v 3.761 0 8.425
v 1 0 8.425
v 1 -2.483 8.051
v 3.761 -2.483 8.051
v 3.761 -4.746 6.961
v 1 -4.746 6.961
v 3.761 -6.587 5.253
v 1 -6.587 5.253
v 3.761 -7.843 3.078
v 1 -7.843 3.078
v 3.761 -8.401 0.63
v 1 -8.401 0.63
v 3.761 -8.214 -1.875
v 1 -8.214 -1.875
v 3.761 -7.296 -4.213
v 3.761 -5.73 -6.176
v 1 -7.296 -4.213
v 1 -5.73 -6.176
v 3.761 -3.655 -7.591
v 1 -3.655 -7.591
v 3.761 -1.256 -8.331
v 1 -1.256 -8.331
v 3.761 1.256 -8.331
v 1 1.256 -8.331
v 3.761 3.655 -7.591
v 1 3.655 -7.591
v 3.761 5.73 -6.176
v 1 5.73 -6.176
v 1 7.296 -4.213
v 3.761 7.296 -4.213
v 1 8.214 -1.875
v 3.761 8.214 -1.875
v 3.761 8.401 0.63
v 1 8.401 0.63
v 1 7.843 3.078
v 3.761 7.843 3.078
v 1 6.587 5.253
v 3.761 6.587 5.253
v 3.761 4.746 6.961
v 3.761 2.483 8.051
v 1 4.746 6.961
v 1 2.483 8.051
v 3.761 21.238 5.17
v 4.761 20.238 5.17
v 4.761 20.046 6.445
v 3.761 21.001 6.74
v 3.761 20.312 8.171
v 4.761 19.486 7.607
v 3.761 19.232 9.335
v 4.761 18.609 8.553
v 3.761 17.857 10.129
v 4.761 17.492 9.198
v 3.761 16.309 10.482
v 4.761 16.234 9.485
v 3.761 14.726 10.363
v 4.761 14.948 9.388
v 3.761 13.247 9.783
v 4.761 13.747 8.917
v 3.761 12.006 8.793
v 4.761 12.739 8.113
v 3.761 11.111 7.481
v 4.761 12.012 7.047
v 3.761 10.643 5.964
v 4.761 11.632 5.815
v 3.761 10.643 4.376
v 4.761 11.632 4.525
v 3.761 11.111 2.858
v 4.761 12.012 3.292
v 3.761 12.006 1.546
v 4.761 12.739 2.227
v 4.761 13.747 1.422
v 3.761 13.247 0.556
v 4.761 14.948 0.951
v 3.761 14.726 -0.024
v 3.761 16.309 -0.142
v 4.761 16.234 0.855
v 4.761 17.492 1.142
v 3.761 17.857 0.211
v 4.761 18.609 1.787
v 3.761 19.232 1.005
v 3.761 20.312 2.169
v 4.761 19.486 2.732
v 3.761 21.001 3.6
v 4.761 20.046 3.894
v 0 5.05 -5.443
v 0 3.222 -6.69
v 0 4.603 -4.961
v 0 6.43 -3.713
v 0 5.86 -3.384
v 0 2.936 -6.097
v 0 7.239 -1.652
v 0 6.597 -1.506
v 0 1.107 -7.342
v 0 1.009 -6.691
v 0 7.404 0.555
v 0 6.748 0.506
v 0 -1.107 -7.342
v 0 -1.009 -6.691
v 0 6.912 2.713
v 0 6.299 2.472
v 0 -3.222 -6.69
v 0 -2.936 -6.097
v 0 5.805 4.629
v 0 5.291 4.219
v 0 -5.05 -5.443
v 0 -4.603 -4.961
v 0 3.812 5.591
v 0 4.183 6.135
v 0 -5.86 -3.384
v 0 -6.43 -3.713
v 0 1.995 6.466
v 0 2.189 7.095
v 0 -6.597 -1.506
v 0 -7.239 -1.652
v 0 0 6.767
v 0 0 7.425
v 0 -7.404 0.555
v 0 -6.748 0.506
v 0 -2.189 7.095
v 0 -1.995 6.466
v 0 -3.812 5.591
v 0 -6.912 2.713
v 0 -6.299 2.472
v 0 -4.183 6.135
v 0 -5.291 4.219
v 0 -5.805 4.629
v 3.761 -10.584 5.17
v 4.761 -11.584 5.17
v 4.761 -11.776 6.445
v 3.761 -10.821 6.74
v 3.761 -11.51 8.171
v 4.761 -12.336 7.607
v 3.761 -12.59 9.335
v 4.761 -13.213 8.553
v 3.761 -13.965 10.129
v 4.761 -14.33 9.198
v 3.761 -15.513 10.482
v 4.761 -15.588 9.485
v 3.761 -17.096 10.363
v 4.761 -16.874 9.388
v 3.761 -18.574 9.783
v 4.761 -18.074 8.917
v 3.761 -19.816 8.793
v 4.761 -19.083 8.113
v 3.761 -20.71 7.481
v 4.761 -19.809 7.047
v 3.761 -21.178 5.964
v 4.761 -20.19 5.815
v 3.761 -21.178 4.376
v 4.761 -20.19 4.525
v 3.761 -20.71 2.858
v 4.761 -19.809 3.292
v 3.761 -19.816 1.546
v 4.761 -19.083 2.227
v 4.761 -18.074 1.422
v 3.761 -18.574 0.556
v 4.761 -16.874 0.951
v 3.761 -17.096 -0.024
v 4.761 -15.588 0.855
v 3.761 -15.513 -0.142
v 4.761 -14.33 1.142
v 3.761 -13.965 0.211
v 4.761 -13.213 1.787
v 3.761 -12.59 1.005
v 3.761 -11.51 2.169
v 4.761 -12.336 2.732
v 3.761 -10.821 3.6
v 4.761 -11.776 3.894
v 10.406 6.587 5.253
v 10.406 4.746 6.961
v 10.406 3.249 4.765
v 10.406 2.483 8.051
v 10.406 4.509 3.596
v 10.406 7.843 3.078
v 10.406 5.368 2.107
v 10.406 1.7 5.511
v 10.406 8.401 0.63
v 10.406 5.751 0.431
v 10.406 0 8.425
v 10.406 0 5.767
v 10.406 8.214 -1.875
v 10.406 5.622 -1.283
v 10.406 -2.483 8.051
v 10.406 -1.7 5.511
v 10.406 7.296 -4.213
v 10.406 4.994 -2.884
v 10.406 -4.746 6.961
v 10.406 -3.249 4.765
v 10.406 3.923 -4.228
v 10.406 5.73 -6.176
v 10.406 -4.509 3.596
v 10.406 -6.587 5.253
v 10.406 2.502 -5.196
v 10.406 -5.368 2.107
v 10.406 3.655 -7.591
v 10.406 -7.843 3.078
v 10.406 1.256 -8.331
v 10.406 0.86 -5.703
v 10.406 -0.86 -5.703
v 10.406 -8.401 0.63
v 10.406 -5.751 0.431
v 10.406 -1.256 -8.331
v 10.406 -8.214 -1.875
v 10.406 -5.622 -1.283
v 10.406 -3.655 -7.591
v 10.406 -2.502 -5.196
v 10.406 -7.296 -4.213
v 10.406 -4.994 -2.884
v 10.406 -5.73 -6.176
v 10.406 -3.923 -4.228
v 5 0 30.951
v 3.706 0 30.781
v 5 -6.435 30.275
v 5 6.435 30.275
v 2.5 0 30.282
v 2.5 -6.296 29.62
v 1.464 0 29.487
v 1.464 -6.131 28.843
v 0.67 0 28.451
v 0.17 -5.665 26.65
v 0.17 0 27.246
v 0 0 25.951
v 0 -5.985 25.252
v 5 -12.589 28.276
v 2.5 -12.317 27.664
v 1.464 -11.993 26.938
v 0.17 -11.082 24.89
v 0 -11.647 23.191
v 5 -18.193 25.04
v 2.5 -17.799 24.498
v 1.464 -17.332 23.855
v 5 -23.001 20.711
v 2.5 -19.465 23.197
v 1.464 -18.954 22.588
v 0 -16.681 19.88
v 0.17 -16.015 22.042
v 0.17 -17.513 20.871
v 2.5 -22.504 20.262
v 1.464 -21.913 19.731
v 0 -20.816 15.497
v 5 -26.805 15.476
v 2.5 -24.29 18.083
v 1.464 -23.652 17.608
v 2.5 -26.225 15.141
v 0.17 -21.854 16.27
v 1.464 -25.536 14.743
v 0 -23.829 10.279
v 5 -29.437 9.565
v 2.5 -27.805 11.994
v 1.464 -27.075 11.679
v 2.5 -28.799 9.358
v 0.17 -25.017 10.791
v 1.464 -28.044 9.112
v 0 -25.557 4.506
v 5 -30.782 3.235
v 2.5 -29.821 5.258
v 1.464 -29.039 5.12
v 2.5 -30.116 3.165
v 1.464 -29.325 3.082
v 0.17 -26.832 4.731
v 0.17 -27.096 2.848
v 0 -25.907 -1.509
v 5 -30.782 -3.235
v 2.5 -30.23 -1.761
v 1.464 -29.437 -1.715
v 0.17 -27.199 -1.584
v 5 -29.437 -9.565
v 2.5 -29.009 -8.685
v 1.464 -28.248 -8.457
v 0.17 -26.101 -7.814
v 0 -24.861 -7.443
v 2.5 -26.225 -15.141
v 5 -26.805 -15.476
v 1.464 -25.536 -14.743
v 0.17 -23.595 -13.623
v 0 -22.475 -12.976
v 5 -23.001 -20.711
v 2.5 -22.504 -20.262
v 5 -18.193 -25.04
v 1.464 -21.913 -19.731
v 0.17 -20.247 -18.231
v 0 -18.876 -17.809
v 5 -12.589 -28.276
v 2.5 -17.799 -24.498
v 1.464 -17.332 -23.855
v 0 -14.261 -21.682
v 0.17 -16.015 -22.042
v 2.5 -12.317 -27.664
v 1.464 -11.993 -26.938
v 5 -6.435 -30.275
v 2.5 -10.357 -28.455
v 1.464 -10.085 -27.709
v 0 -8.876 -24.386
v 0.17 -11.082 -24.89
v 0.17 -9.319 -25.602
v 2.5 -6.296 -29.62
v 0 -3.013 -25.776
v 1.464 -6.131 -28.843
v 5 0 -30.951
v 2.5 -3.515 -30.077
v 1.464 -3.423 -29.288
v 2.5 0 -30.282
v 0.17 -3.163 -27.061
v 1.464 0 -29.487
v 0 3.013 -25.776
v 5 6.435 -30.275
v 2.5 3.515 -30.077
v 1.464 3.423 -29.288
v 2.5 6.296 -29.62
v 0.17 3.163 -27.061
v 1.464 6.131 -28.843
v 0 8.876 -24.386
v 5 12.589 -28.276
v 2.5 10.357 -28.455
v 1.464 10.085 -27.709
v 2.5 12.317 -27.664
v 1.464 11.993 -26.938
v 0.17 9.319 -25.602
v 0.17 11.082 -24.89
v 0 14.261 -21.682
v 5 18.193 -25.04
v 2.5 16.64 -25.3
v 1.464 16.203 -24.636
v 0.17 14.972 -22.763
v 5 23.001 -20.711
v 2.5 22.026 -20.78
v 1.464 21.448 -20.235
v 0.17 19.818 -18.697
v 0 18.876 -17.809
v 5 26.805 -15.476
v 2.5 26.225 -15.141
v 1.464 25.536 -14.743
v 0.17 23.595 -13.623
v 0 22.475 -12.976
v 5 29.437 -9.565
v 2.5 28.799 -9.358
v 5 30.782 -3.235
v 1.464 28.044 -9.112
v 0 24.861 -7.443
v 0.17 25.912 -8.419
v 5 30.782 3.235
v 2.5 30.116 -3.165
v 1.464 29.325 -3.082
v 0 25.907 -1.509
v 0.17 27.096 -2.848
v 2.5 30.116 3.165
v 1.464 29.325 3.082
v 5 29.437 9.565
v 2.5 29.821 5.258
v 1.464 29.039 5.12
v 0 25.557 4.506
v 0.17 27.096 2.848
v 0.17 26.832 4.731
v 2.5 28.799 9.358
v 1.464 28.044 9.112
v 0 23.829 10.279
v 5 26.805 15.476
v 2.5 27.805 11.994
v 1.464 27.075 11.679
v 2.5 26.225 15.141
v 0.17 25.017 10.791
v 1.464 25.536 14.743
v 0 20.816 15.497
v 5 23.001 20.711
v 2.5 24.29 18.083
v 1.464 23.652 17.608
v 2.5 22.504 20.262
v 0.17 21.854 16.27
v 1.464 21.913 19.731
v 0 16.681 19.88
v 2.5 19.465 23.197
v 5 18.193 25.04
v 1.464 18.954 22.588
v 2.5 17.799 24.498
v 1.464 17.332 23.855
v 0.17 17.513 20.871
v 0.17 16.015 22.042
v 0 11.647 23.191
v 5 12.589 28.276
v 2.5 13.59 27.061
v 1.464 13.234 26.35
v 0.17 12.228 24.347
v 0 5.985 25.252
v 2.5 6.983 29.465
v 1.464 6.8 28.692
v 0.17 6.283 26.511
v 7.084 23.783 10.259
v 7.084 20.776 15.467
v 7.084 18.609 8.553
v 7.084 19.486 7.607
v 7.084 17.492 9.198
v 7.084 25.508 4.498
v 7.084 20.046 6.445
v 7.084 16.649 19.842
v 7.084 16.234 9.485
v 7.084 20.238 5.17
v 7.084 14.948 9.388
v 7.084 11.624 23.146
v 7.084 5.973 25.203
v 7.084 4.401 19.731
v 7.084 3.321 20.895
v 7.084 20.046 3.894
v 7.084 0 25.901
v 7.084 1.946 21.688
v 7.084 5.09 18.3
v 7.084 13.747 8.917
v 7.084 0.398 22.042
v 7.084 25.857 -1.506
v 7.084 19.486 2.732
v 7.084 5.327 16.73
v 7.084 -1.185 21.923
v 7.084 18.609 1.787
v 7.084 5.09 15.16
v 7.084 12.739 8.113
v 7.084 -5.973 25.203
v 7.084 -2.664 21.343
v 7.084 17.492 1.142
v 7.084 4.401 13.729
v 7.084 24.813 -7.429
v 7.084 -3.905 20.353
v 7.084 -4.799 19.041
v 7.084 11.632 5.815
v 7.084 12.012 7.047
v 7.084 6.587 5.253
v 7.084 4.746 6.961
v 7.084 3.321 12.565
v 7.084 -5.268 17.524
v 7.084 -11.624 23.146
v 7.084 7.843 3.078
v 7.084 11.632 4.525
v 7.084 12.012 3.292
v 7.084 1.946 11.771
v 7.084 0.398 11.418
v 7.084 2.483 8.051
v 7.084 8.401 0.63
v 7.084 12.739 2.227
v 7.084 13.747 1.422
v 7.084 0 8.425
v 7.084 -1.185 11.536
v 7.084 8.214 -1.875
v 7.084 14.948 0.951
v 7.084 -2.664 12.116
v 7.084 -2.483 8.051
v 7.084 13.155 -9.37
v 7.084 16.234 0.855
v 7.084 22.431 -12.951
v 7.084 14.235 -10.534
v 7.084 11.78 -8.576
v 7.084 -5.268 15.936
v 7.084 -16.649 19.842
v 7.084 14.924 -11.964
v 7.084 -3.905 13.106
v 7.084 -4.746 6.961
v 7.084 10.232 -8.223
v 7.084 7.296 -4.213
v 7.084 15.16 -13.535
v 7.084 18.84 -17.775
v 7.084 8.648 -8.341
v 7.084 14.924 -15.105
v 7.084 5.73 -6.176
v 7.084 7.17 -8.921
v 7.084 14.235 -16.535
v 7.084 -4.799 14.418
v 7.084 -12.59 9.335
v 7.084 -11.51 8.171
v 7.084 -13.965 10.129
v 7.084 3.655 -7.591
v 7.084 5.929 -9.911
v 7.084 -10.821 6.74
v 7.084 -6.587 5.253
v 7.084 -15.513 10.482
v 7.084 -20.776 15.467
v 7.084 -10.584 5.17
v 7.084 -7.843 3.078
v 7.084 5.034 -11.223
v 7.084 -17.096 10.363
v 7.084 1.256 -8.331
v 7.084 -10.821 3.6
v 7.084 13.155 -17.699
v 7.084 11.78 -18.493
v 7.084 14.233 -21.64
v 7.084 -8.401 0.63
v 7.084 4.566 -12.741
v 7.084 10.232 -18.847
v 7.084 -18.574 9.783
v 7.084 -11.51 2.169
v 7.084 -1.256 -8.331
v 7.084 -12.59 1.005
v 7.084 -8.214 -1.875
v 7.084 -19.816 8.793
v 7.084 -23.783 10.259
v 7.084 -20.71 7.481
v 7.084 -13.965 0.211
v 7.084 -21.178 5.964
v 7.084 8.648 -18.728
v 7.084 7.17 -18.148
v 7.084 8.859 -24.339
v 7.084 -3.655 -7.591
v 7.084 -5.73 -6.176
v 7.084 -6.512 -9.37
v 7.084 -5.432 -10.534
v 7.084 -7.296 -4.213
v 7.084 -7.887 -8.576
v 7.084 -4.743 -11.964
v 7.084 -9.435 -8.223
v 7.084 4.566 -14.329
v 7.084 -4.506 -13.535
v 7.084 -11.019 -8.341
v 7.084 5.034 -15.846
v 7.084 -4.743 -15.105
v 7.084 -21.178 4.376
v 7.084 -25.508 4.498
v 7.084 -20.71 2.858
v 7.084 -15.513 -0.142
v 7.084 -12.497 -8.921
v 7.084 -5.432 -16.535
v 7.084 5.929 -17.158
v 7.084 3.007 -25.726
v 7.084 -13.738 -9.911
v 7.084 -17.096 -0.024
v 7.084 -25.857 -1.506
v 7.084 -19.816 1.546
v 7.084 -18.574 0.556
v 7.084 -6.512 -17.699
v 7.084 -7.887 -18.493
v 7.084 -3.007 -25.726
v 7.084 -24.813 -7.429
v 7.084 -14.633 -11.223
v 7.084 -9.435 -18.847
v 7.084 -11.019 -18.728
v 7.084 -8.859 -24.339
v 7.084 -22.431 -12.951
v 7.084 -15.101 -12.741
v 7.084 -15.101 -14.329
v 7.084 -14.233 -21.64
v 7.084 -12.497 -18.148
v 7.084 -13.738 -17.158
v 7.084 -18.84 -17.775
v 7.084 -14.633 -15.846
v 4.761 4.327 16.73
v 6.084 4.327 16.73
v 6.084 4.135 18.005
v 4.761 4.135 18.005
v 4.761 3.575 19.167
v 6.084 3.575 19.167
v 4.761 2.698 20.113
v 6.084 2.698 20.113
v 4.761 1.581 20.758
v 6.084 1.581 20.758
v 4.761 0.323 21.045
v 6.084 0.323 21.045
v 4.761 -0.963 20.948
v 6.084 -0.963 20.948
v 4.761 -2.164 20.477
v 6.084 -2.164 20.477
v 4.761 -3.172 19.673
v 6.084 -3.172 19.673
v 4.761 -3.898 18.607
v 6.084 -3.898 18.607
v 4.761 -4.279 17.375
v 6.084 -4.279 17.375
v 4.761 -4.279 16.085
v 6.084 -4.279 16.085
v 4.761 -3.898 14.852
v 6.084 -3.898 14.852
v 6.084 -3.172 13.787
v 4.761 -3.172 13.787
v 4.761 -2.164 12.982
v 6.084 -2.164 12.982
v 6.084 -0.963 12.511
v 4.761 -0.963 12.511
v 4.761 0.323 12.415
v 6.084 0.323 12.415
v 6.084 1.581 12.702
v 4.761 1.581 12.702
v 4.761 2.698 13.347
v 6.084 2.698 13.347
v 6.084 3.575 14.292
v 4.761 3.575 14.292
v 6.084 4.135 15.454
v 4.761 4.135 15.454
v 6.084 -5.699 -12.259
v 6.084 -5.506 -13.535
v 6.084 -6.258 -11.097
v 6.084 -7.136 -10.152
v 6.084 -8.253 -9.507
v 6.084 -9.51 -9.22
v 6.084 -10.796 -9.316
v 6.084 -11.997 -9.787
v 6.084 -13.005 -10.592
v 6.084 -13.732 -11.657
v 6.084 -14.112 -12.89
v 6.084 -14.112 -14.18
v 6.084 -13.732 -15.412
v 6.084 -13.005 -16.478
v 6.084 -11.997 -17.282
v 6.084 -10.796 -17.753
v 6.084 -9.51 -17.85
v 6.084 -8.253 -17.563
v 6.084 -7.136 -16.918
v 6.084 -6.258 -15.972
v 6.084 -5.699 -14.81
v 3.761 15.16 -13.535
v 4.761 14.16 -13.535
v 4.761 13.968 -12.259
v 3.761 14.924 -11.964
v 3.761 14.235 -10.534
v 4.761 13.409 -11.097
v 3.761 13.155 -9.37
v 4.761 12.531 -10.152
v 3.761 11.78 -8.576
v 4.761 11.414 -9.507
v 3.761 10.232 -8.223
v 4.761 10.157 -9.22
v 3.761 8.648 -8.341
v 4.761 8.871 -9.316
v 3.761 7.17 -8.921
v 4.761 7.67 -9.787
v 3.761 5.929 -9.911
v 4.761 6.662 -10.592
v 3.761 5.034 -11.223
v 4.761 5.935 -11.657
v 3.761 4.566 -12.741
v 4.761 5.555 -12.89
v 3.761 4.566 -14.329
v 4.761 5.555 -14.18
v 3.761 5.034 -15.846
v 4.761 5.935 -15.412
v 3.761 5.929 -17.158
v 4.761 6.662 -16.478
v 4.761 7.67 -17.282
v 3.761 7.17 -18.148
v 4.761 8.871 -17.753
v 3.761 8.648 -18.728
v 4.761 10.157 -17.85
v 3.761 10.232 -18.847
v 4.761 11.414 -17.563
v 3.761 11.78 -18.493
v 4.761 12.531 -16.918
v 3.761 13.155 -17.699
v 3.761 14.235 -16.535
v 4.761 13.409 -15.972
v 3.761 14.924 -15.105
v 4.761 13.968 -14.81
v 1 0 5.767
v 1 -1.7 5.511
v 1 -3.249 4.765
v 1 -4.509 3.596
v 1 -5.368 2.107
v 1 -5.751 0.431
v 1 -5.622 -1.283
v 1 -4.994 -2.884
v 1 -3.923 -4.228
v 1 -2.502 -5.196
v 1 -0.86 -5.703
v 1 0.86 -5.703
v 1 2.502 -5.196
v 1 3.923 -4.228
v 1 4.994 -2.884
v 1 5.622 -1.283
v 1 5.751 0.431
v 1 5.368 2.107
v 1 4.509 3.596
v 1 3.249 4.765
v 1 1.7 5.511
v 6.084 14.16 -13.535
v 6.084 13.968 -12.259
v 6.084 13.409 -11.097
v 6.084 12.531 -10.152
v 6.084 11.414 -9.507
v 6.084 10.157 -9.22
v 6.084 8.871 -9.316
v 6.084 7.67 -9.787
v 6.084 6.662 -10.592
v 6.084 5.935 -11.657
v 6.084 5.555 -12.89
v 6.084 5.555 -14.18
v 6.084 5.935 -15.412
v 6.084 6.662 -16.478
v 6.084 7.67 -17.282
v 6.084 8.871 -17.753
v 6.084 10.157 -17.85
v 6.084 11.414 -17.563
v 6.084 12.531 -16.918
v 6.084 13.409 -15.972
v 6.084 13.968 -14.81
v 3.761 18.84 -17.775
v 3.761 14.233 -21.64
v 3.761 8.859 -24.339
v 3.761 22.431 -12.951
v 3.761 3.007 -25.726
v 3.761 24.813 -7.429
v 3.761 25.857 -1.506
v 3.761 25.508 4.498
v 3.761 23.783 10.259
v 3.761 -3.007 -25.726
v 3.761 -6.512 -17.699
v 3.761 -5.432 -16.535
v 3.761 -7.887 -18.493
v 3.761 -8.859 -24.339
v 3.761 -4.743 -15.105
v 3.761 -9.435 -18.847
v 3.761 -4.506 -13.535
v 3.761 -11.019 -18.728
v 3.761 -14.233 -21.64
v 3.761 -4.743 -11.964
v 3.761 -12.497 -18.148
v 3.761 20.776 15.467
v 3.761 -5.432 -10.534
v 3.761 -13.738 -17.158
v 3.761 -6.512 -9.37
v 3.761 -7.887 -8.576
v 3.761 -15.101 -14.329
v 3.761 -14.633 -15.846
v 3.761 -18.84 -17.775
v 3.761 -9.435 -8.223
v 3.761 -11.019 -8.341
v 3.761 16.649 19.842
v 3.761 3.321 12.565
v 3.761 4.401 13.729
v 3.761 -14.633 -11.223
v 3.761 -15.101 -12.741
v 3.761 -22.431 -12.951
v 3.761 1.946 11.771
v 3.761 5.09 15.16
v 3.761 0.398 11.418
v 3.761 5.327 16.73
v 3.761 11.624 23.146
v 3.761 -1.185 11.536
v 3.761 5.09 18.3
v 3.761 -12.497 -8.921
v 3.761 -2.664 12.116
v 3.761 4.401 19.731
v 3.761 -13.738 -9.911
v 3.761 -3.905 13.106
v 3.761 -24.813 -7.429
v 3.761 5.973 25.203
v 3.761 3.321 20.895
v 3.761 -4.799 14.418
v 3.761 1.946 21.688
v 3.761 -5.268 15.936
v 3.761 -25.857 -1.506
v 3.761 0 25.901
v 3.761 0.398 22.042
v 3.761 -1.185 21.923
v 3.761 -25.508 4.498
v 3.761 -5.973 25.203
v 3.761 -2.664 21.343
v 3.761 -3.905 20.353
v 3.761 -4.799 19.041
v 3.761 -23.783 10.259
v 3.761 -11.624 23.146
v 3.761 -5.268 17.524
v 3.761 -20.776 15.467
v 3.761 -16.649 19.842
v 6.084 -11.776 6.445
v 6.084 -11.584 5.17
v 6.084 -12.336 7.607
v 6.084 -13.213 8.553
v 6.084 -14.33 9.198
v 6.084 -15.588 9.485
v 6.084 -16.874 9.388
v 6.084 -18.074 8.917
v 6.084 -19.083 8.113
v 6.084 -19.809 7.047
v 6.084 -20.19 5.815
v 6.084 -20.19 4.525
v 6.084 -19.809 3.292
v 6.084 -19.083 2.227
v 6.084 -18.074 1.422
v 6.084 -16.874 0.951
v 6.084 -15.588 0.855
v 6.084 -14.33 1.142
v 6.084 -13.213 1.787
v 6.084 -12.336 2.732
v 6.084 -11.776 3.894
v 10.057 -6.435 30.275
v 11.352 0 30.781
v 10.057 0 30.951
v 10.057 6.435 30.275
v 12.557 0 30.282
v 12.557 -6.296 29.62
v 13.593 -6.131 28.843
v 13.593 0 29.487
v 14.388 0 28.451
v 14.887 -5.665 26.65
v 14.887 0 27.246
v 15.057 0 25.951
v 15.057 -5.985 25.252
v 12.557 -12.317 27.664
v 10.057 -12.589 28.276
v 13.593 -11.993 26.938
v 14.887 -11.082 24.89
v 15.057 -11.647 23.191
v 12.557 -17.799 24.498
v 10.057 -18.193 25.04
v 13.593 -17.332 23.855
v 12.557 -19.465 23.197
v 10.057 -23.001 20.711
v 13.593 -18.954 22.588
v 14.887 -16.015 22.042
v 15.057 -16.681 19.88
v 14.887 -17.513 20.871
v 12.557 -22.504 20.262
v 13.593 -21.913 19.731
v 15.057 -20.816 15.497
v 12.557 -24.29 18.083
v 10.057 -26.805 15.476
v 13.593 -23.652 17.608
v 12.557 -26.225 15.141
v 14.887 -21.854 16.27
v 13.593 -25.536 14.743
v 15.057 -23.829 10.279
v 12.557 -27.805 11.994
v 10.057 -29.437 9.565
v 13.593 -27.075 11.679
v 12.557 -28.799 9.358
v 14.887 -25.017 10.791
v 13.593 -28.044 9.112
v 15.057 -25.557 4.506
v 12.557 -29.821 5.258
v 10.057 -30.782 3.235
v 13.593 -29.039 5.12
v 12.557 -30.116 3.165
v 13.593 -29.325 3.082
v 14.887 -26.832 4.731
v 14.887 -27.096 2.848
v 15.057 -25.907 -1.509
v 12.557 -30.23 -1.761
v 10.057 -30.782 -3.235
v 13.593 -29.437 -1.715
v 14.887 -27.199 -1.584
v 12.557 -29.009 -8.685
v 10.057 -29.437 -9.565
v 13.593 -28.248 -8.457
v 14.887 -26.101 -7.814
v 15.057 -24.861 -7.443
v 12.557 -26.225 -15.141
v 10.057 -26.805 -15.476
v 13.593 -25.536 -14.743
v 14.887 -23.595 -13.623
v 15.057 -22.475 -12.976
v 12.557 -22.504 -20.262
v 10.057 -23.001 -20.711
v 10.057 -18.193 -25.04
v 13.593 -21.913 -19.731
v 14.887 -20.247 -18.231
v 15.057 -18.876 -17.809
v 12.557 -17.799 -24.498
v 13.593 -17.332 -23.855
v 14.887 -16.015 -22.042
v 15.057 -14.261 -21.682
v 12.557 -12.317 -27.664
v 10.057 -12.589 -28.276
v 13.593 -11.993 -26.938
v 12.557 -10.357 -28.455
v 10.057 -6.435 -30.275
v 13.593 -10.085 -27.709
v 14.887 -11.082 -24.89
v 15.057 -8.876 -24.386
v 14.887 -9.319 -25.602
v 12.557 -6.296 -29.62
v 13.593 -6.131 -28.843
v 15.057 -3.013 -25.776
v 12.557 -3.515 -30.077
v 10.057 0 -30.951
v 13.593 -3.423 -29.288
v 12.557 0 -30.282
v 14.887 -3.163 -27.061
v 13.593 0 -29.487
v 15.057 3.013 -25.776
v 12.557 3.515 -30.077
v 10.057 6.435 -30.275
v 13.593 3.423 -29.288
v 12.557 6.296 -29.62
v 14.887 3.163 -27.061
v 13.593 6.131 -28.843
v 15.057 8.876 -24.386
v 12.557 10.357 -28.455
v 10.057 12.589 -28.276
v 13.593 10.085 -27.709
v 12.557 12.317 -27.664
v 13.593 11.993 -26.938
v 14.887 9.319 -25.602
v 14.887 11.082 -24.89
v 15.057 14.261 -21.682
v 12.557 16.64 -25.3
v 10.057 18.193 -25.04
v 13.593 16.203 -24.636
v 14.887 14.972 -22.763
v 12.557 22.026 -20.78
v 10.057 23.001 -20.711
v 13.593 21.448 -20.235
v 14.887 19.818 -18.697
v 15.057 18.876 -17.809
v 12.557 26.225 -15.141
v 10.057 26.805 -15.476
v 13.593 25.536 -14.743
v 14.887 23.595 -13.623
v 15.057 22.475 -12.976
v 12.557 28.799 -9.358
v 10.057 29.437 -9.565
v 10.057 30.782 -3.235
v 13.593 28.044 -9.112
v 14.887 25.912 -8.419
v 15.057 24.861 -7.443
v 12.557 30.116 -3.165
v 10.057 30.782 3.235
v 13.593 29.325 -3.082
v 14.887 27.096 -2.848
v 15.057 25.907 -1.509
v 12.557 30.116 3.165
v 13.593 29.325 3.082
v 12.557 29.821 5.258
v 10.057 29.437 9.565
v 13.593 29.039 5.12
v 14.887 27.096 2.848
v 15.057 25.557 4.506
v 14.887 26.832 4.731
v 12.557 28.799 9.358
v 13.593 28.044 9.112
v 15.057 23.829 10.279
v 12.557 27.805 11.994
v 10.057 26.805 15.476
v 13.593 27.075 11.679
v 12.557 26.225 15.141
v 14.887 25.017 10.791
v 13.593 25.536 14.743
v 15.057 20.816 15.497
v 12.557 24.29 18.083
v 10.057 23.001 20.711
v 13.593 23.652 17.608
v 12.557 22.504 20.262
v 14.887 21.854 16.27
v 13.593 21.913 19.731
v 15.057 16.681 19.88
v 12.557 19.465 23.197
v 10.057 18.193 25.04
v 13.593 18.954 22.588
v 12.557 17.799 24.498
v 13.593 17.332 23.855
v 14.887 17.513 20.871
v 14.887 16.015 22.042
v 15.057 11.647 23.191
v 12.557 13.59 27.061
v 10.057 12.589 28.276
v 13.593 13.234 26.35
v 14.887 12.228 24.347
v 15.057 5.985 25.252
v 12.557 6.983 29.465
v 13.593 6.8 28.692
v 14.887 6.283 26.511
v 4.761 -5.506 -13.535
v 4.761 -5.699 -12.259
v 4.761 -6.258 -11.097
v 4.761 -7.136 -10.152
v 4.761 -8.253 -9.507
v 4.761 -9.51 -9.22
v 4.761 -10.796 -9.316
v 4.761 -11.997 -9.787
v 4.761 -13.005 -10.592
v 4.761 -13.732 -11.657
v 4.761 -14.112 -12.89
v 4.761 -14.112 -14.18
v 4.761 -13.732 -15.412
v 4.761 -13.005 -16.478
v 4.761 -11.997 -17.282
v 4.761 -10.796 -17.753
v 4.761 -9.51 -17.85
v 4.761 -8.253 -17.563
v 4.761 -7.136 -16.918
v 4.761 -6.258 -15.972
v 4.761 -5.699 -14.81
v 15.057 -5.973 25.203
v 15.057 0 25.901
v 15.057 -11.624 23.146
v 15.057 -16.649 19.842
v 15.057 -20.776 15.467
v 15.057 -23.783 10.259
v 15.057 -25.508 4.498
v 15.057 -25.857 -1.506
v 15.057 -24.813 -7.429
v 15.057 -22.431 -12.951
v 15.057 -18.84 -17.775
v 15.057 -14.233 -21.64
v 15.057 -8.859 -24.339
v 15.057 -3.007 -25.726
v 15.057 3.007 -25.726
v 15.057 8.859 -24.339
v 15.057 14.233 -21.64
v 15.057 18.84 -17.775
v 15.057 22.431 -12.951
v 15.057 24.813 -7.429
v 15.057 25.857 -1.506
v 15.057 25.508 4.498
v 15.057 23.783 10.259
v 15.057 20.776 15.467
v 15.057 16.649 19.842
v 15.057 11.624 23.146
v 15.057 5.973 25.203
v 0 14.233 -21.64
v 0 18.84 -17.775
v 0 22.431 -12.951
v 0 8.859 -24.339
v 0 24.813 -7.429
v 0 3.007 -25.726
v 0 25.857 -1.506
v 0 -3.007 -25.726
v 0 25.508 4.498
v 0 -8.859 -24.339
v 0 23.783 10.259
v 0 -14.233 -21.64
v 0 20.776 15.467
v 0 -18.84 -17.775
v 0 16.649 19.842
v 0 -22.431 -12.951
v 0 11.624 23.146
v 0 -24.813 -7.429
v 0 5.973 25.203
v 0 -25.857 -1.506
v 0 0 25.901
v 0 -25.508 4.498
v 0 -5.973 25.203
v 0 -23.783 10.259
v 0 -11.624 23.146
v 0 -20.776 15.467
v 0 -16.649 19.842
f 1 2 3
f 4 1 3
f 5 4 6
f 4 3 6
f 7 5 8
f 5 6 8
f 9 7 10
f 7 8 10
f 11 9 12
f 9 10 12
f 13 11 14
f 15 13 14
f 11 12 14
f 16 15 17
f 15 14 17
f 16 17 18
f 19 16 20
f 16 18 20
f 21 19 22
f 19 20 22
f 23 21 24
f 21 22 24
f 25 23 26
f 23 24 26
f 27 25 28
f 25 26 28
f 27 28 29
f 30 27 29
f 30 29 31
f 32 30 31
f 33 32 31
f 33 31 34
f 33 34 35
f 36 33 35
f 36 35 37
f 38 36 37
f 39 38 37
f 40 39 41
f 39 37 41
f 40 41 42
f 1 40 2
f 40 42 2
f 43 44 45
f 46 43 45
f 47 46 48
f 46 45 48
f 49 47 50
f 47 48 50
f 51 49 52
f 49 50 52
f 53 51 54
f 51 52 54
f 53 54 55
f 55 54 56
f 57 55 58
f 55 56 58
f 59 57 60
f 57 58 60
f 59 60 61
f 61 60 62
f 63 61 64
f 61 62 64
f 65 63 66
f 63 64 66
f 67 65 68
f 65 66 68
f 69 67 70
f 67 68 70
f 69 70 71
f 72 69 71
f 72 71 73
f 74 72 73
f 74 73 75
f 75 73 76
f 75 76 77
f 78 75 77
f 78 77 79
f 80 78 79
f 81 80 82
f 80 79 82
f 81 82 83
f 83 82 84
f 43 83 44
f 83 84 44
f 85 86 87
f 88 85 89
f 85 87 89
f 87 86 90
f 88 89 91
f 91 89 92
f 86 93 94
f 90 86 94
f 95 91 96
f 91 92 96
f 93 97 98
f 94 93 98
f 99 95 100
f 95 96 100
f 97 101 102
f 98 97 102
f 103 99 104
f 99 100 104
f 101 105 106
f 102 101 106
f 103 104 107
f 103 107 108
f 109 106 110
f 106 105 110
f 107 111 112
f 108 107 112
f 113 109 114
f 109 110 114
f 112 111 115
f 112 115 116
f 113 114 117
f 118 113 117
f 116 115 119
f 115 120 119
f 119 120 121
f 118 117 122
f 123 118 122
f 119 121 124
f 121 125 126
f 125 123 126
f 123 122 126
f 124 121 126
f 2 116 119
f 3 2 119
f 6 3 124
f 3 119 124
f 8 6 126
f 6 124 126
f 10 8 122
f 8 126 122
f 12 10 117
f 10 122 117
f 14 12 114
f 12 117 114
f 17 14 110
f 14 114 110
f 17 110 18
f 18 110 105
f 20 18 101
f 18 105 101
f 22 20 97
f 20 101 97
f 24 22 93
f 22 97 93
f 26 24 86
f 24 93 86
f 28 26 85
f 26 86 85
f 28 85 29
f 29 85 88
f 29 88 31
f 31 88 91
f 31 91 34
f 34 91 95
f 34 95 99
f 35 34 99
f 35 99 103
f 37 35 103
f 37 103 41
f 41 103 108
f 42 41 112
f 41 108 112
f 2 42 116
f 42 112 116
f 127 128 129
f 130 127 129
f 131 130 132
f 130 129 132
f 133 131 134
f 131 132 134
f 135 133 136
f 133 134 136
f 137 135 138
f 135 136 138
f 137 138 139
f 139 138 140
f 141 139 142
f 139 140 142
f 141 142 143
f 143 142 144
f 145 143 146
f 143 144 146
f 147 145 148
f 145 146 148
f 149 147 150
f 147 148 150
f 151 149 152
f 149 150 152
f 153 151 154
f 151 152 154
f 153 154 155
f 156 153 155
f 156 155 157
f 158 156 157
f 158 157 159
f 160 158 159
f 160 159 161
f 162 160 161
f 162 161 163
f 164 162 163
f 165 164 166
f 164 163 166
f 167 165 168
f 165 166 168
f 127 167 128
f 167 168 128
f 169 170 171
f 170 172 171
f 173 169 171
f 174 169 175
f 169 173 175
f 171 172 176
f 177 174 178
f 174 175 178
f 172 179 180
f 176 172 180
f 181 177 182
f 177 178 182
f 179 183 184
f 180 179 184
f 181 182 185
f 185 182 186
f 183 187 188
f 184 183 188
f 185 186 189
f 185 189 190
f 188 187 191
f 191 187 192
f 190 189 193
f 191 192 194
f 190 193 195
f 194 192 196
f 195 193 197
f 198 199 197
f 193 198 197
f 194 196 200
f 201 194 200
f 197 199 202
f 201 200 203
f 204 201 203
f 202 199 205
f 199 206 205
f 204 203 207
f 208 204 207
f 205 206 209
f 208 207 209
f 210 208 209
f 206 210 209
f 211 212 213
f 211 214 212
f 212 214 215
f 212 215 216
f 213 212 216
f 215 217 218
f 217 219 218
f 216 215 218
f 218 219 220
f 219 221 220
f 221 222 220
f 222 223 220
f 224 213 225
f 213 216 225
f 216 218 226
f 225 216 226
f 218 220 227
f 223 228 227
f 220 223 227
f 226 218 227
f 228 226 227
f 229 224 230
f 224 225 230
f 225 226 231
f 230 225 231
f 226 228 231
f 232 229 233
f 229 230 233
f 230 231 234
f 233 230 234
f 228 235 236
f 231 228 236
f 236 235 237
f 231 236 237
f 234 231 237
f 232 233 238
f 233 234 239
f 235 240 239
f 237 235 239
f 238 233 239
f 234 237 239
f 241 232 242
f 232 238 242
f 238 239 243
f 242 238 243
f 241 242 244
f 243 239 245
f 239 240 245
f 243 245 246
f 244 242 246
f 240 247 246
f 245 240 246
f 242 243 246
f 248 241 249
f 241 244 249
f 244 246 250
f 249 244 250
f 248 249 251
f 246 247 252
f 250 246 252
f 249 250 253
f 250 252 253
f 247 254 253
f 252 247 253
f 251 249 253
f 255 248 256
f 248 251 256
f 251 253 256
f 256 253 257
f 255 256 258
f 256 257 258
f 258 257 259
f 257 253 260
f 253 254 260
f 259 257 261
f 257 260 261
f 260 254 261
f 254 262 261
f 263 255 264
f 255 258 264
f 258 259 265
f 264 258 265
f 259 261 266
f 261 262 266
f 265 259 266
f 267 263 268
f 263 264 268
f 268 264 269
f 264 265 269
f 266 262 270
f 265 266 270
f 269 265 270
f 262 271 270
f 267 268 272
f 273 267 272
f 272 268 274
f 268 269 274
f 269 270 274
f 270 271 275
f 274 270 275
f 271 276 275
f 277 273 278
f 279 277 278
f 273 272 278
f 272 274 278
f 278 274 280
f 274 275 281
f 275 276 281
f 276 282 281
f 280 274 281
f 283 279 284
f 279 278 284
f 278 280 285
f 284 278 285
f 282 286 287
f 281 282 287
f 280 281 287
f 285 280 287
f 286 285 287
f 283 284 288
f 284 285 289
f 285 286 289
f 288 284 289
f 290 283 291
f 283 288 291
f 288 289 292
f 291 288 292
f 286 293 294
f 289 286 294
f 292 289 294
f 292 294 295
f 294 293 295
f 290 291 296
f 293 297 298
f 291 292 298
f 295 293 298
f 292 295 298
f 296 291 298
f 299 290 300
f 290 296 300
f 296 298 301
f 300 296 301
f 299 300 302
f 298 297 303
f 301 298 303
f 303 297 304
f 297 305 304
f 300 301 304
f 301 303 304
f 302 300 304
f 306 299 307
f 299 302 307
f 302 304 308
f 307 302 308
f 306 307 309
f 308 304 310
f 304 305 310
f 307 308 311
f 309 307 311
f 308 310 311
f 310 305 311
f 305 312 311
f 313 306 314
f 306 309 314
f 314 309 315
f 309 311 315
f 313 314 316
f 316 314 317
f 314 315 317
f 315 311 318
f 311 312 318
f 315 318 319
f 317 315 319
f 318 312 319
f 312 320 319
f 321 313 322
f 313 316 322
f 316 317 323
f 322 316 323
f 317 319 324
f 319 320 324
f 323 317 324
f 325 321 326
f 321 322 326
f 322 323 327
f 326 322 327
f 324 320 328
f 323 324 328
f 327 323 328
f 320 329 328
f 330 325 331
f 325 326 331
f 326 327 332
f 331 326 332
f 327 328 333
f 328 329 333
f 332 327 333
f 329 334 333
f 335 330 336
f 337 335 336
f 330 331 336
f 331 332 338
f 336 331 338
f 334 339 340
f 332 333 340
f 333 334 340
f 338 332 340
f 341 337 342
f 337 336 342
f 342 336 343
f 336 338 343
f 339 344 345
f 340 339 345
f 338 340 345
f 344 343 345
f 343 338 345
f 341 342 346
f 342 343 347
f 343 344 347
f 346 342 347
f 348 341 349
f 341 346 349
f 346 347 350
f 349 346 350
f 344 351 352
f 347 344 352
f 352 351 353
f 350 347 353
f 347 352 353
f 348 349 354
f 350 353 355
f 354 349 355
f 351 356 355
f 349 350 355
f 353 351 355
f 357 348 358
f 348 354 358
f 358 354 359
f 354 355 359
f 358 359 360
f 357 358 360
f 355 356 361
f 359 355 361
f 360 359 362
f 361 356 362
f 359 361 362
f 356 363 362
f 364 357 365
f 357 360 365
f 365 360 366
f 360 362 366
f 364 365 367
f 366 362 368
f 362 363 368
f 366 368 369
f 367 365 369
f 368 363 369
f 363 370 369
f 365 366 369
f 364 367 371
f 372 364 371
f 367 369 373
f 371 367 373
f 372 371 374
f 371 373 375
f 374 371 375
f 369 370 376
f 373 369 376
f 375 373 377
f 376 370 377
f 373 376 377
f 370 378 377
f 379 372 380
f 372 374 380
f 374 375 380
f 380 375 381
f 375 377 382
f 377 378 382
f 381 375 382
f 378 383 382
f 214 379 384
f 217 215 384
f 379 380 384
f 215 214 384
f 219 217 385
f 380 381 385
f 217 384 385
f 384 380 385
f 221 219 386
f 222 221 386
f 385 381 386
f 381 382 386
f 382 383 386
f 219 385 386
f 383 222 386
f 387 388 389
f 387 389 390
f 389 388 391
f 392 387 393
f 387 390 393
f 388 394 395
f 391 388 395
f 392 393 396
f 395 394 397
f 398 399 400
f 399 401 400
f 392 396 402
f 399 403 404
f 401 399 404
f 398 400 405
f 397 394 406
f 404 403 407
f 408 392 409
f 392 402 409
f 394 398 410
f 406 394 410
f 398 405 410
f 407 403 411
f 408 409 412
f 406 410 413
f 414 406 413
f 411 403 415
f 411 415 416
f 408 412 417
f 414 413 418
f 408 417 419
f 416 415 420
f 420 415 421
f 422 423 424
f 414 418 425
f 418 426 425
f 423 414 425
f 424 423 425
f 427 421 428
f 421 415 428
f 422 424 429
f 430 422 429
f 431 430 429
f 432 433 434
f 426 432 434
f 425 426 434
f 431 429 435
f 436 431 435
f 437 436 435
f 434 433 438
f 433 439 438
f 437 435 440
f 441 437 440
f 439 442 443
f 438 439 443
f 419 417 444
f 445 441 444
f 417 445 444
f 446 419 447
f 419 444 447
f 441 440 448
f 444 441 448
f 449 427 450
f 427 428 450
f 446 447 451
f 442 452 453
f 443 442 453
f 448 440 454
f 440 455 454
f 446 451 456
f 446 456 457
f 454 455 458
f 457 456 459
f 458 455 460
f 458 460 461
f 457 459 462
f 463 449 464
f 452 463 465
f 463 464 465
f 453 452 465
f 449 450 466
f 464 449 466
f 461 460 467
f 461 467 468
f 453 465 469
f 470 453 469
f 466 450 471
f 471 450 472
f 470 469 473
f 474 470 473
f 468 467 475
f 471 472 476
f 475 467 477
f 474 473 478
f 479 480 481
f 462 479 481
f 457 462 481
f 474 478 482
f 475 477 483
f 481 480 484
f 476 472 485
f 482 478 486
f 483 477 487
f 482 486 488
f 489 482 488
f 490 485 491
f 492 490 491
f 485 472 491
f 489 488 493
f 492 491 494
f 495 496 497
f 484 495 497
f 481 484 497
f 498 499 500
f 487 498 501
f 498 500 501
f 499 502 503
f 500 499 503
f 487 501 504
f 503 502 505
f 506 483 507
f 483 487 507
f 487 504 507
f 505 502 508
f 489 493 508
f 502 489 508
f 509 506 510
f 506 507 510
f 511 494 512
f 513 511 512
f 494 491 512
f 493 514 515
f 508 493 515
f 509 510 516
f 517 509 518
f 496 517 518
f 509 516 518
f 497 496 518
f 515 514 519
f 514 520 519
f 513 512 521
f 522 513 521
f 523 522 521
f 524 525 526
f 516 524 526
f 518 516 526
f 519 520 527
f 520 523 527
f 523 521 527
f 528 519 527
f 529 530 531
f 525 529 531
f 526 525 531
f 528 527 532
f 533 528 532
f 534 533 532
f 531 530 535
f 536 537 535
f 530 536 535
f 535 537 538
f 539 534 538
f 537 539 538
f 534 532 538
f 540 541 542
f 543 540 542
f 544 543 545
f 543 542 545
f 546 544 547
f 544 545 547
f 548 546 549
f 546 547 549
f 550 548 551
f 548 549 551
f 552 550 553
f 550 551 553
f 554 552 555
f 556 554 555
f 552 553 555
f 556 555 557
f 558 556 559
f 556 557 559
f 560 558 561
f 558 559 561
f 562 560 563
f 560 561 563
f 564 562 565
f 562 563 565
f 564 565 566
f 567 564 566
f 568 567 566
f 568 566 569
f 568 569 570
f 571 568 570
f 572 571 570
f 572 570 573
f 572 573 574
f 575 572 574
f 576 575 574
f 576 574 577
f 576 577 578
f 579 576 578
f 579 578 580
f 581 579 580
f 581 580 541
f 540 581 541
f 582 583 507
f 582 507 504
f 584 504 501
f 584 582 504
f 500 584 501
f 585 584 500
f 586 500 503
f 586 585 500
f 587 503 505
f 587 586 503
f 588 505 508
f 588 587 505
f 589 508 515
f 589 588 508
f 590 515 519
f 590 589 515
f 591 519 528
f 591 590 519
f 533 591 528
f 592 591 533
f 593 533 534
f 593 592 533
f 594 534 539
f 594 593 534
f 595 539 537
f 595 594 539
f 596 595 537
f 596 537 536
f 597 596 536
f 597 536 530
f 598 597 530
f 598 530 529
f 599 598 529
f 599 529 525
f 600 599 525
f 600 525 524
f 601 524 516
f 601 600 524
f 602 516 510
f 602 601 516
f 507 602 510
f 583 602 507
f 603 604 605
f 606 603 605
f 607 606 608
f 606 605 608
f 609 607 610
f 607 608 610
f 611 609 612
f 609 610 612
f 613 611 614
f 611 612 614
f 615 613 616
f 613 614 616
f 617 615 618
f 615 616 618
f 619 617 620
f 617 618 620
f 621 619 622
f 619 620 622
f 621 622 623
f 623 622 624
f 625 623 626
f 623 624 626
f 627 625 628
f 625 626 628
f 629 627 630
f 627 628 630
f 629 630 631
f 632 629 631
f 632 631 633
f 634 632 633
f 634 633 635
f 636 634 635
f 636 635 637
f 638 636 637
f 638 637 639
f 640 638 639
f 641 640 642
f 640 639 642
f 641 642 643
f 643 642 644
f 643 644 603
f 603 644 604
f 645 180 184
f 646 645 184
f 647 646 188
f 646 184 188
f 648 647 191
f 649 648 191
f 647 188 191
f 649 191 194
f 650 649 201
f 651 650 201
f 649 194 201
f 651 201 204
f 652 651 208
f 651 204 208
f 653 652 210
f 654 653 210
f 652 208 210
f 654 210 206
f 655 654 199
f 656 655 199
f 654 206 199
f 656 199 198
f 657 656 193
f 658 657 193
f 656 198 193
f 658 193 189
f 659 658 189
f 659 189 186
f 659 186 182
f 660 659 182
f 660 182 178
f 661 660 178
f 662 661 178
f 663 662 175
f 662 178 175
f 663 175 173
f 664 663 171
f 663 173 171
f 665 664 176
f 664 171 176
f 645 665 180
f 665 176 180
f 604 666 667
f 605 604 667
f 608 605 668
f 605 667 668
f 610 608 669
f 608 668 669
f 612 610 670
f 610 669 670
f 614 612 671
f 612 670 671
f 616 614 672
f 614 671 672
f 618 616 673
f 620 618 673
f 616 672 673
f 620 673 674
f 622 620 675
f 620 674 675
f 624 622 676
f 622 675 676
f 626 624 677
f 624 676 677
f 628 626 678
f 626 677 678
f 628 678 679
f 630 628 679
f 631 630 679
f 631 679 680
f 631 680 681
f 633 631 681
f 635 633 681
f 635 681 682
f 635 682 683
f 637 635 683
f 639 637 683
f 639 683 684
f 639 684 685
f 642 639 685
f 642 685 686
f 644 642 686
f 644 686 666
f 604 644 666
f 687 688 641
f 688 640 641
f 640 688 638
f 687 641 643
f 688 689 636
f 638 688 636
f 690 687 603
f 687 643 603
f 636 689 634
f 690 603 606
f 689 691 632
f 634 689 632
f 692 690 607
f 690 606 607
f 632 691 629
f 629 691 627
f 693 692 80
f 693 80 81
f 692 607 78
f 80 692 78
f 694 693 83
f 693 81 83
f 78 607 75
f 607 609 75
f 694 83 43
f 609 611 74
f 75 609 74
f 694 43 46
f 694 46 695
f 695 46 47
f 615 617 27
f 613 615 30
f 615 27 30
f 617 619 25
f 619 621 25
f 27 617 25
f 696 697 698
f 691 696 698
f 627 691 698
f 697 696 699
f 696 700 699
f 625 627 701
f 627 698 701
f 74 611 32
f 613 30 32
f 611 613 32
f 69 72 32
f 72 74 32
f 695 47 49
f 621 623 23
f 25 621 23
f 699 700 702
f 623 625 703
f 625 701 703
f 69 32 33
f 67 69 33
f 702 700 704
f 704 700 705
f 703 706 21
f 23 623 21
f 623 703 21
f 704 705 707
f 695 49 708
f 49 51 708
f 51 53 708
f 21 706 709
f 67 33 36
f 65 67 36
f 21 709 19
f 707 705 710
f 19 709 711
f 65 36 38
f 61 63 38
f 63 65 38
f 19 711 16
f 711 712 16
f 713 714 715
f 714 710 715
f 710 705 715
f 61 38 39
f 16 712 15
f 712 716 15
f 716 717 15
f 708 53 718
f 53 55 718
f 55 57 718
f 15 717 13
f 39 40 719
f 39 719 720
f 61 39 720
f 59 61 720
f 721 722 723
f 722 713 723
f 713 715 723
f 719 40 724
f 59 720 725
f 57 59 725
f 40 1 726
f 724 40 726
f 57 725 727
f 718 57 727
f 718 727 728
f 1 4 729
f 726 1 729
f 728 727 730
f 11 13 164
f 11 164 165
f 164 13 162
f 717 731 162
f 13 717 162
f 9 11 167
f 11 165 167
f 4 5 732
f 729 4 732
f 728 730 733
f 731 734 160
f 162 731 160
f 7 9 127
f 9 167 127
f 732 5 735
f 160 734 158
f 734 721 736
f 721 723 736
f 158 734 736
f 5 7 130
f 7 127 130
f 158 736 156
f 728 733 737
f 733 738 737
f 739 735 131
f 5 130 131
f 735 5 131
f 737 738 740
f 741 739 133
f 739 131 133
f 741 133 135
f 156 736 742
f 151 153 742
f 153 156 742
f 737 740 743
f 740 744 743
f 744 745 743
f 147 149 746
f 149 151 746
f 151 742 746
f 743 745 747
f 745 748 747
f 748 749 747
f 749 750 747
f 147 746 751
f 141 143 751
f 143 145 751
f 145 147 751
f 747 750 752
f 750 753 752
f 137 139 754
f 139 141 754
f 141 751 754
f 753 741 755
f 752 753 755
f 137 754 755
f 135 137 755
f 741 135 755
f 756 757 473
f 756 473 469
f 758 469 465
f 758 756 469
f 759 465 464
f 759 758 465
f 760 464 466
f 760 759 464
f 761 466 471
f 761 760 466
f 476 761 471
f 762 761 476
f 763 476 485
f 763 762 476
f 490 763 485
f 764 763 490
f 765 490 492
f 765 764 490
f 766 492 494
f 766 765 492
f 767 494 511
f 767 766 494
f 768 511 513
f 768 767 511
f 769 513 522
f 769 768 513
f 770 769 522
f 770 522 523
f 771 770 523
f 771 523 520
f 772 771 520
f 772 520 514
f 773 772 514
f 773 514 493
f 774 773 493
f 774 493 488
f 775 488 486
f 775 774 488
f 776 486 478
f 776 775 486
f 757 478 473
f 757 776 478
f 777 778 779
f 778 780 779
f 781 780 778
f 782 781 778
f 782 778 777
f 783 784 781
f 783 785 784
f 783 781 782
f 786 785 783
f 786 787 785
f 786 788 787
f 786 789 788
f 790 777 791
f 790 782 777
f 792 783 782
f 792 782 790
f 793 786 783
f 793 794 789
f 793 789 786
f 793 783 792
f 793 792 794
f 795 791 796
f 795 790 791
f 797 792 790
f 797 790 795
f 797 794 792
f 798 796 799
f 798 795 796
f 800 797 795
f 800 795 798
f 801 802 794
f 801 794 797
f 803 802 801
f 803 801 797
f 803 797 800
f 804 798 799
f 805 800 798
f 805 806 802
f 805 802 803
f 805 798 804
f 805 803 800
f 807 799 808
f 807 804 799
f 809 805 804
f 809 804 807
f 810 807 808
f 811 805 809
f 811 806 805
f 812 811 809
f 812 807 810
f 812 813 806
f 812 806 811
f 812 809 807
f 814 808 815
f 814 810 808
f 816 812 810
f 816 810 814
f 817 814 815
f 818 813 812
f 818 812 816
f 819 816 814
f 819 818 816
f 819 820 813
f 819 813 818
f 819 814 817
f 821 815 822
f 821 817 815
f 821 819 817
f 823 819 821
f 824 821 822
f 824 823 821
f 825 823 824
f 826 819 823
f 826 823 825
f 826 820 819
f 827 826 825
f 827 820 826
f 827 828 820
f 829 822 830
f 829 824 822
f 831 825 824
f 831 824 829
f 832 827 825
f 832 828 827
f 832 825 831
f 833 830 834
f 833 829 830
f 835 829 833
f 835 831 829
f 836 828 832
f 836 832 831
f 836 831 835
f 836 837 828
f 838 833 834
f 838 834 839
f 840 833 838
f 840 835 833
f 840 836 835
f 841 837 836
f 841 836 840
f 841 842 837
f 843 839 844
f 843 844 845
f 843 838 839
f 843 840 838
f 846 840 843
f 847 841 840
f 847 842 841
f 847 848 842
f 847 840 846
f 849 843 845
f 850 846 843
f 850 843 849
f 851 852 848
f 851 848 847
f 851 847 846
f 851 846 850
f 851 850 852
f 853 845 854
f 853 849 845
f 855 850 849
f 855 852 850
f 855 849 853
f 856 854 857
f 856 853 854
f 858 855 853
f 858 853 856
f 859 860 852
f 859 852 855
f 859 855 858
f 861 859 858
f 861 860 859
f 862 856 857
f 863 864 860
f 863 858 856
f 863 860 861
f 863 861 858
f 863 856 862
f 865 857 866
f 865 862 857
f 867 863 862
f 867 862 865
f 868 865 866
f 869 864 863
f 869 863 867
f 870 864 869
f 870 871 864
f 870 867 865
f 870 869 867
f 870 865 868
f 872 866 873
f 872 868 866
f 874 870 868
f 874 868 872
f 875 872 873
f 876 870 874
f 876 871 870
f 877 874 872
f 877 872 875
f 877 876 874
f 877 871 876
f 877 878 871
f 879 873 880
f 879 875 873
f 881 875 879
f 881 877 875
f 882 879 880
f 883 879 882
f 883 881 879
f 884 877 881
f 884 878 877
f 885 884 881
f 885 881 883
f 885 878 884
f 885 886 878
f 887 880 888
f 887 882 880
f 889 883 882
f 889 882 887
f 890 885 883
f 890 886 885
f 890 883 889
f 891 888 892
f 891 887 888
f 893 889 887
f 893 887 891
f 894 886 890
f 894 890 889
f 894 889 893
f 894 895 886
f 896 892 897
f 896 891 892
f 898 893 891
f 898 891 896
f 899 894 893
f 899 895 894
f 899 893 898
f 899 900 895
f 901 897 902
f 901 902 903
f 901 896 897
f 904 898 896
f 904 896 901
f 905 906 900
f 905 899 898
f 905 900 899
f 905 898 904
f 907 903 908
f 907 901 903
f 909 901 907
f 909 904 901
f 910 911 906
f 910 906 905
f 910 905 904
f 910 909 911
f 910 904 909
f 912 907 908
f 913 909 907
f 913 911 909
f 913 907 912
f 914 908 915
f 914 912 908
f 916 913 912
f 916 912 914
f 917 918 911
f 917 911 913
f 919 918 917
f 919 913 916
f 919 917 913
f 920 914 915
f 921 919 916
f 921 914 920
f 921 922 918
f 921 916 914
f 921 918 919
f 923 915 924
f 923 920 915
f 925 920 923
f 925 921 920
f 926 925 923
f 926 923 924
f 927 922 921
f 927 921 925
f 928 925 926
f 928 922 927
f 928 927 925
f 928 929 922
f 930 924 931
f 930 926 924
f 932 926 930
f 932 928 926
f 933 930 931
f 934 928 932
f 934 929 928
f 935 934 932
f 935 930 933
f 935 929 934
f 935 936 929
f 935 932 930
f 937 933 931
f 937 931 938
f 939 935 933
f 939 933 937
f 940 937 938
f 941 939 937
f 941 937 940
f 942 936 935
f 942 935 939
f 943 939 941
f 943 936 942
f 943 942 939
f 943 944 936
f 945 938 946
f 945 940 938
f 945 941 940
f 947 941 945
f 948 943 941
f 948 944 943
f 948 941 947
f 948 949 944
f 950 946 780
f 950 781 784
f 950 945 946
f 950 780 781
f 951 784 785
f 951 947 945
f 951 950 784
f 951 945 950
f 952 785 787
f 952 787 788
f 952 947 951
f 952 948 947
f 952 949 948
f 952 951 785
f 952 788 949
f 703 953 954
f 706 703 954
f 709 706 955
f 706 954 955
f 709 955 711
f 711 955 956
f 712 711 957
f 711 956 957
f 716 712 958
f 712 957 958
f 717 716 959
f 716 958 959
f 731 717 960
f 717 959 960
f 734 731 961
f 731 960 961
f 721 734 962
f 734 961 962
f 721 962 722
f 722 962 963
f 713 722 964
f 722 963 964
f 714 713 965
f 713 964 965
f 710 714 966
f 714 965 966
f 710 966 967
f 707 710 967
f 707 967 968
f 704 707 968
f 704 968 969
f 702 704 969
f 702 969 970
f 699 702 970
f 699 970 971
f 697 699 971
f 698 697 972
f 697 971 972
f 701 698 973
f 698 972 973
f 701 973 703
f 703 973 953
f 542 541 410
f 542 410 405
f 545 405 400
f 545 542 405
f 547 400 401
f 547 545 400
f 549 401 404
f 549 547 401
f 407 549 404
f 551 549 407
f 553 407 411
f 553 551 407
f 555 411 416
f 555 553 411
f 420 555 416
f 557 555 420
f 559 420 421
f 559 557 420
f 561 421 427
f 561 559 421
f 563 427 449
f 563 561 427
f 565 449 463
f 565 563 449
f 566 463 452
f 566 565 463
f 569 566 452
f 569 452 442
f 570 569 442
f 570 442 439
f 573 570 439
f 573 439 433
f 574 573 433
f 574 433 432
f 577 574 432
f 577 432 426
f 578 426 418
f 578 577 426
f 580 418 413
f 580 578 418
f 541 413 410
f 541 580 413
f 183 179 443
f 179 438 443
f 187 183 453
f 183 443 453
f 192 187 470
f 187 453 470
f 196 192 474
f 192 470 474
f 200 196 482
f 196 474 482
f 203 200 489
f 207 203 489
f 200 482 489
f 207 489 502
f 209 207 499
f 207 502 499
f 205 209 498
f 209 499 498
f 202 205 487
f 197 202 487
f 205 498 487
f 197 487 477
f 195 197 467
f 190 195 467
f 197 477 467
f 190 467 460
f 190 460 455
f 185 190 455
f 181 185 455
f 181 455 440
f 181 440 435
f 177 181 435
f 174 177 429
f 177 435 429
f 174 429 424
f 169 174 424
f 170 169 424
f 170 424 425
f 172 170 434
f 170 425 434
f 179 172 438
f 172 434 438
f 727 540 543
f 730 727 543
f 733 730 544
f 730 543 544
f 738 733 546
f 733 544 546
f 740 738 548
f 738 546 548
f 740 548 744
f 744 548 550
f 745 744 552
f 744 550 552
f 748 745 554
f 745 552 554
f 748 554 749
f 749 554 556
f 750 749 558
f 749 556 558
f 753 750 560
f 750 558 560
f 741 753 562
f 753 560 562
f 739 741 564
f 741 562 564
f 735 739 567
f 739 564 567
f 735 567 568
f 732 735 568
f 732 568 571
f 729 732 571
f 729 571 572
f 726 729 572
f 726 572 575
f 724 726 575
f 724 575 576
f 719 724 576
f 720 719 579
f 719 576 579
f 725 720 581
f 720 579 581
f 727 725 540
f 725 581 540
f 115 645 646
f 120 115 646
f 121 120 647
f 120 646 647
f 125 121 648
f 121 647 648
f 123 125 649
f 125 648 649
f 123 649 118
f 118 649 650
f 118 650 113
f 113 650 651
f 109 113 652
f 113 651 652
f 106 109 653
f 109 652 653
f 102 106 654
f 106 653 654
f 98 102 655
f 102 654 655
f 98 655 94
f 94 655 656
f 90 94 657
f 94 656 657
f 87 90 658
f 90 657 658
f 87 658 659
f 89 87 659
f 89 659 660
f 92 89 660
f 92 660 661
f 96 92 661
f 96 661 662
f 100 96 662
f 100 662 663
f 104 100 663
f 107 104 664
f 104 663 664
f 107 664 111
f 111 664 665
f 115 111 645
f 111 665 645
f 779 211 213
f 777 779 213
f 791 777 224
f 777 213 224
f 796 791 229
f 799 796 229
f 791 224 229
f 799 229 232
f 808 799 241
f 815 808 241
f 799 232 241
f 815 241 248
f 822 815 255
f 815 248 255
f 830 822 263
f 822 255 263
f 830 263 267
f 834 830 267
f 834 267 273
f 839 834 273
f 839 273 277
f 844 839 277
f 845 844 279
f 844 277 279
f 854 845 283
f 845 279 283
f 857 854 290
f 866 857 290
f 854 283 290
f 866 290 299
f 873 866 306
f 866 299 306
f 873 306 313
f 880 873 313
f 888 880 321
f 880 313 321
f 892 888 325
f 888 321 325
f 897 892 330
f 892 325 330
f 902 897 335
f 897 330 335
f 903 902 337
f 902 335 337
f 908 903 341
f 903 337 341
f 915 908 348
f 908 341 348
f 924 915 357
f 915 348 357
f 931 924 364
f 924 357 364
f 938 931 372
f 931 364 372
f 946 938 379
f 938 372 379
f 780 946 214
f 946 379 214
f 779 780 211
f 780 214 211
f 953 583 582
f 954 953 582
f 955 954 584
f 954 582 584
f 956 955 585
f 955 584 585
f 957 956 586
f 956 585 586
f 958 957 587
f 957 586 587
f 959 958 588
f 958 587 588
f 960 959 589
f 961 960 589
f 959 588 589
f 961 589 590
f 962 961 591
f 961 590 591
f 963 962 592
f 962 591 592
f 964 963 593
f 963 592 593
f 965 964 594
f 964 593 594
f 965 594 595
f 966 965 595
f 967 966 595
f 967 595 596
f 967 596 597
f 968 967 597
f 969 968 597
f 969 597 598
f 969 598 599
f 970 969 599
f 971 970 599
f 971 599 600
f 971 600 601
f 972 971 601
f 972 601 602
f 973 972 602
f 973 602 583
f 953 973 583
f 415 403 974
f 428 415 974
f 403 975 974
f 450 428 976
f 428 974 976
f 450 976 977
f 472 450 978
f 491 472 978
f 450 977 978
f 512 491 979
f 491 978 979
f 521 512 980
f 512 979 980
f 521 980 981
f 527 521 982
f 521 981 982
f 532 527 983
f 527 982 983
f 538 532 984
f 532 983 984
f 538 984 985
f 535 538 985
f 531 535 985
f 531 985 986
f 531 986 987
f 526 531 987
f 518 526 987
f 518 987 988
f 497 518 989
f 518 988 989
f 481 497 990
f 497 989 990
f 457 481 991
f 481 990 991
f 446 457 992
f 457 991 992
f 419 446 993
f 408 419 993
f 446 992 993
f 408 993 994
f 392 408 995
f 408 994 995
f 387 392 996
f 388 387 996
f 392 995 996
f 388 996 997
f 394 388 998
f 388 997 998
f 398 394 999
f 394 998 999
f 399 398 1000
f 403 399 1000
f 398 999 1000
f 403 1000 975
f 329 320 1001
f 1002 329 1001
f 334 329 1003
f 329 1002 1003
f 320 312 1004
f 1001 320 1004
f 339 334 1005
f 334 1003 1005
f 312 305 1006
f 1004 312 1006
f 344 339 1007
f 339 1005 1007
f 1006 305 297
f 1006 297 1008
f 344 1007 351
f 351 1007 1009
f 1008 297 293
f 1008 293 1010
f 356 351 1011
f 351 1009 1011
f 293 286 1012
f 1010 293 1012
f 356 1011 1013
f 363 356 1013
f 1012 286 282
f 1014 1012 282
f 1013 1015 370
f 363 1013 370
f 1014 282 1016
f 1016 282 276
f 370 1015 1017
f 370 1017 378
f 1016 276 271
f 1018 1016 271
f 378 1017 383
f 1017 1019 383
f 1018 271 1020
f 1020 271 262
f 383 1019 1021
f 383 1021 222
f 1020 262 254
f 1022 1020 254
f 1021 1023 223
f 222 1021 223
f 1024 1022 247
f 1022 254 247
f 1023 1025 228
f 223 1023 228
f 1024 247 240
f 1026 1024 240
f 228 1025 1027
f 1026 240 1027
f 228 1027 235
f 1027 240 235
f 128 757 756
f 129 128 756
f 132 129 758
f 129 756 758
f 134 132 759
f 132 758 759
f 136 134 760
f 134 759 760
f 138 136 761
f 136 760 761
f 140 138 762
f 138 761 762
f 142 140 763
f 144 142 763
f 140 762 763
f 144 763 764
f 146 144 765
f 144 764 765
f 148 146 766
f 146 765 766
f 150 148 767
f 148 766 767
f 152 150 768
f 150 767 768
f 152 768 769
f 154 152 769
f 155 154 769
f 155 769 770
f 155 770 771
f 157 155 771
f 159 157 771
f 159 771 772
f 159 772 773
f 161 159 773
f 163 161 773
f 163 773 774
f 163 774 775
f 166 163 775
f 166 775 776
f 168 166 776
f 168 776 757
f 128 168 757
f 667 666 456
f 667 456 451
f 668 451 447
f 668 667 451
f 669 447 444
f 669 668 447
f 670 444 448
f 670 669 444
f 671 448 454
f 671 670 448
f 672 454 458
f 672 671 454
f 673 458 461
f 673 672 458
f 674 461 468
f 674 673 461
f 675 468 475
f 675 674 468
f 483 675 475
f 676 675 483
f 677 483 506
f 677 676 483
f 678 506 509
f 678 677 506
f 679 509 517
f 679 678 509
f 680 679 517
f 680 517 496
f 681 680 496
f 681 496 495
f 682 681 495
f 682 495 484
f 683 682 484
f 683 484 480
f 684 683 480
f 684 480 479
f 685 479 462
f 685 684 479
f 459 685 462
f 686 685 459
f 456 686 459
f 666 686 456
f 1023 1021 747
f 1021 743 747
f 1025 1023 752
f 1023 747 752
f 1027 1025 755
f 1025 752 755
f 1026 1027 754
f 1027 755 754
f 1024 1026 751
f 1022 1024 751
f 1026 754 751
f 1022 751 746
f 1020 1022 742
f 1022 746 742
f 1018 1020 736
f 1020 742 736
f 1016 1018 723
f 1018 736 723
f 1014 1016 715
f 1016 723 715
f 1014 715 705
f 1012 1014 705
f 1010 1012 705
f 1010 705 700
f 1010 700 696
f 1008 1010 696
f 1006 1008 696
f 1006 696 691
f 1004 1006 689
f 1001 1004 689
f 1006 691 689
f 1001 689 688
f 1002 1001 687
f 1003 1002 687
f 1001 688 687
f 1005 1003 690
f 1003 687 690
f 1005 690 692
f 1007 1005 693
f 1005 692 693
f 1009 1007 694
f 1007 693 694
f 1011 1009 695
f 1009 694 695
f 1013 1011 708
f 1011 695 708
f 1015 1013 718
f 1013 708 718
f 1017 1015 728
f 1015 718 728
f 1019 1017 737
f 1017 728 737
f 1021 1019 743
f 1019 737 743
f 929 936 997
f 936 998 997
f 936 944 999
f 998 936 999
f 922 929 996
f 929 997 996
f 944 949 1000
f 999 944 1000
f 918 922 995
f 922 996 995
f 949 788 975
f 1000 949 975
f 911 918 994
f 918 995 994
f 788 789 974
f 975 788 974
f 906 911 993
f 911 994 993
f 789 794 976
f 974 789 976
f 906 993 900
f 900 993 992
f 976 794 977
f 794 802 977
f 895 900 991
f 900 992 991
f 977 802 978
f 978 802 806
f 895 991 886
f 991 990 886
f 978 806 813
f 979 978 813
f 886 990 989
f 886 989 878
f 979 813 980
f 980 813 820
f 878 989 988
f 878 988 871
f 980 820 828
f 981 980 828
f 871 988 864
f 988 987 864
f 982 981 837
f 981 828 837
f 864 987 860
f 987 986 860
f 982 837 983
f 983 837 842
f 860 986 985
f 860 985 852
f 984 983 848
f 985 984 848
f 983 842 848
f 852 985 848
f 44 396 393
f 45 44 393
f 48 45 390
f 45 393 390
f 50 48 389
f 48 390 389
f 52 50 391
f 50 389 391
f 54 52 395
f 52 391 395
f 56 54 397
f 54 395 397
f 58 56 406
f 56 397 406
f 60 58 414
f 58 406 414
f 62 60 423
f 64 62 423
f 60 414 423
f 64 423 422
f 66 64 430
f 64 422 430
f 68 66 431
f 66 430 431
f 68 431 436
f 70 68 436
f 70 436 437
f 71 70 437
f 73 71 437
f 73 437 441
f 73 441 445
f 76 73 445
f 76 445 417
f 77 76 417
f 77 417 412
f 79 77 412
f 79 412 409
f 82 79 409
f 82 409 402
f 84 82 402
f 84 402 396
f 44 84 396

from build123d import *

# Parameters (mm, degrees)
F3_D     = 8.654
F3_DEPTH = 10
F3_TIP   = 2.5999238985
F4_R     = 5
F5_SIZE  = 1


with BuildPart() as f1:
    # F0 (on Front) → F1 (revolve)
    with BuildSketch(Plane.XZ):
        Polygon((15.0574529544, 30.9514049441), (0, 30.9514049441), (0, 25.9012449533), (3.761041211, 25.9012449533), (3.761041211, 8.42503272), (0, 8.42503272), (0, 5.7670525275), (10.4059893638, 5.7670525275), (10.4059893638, 8.42503272), (7.0835147053, 8.42503272), (7.0835147053, 25.9012449533), (15.0574529544, 25.9012449533), align=None)
    revolve(axis=Axis((5.2029946819, 0, 0), (1, 0, 0)))

    # F3
    with Locations(Plane(origin=(3.761041211, 0, 0), x_dir=(0, -1, 0), z_dir=(-1, 0, 0))):
        with Locations((-15.9109056188, 5.1697666204), (0, 16.7297162116), (15.9109056188, 5.1697666204), (9.8334804642, -13.5346247262), (-9.8334804642, -13.5346247262)):
            Hole(F3_D / 2, depth=F3_DEPTH)
            with Locations((0, 0, -(F3_DEPTH + F3_TIP / 2))):  # 118° drill point
                Cone(0, F3_D / 2, F3_TIP, mode=Mode.SUBTRACT)

    # F4
    f4_edges = [f1.edges().sort_by_distance(p)[0] for p in [
        (0, 0, -30.951405),
        (15.057453, 0, -30.951405),
    ]]
    fillet(f4_edges, radius=F4_R)

    # F5
    f5_edges = [f1.edges().sort_by_distance(p)[0] for p in [
        (0, 0, -8.425033),
        (0, 0, -5.767053),
        (7.083515, 4.327, 16.729716),
        (7.083515, 14.16048, -13.534625),
        (7.083515, -11.583906, 5.169767),
        (7.083515, -5.50648, -13.534625),
        (3.761041, 14.16048, -13.534625),
        (3.761041, 20.237906, 5.169767),
        (3.761041, 4.327, 16.729716),
        (3.761041, -5.50648, -13.534625),
        (3.761041, -11.583906, 5.169767),
    ]]
    chamfer(f5_edges, length=F5_SIZE)


solid = f1.part
